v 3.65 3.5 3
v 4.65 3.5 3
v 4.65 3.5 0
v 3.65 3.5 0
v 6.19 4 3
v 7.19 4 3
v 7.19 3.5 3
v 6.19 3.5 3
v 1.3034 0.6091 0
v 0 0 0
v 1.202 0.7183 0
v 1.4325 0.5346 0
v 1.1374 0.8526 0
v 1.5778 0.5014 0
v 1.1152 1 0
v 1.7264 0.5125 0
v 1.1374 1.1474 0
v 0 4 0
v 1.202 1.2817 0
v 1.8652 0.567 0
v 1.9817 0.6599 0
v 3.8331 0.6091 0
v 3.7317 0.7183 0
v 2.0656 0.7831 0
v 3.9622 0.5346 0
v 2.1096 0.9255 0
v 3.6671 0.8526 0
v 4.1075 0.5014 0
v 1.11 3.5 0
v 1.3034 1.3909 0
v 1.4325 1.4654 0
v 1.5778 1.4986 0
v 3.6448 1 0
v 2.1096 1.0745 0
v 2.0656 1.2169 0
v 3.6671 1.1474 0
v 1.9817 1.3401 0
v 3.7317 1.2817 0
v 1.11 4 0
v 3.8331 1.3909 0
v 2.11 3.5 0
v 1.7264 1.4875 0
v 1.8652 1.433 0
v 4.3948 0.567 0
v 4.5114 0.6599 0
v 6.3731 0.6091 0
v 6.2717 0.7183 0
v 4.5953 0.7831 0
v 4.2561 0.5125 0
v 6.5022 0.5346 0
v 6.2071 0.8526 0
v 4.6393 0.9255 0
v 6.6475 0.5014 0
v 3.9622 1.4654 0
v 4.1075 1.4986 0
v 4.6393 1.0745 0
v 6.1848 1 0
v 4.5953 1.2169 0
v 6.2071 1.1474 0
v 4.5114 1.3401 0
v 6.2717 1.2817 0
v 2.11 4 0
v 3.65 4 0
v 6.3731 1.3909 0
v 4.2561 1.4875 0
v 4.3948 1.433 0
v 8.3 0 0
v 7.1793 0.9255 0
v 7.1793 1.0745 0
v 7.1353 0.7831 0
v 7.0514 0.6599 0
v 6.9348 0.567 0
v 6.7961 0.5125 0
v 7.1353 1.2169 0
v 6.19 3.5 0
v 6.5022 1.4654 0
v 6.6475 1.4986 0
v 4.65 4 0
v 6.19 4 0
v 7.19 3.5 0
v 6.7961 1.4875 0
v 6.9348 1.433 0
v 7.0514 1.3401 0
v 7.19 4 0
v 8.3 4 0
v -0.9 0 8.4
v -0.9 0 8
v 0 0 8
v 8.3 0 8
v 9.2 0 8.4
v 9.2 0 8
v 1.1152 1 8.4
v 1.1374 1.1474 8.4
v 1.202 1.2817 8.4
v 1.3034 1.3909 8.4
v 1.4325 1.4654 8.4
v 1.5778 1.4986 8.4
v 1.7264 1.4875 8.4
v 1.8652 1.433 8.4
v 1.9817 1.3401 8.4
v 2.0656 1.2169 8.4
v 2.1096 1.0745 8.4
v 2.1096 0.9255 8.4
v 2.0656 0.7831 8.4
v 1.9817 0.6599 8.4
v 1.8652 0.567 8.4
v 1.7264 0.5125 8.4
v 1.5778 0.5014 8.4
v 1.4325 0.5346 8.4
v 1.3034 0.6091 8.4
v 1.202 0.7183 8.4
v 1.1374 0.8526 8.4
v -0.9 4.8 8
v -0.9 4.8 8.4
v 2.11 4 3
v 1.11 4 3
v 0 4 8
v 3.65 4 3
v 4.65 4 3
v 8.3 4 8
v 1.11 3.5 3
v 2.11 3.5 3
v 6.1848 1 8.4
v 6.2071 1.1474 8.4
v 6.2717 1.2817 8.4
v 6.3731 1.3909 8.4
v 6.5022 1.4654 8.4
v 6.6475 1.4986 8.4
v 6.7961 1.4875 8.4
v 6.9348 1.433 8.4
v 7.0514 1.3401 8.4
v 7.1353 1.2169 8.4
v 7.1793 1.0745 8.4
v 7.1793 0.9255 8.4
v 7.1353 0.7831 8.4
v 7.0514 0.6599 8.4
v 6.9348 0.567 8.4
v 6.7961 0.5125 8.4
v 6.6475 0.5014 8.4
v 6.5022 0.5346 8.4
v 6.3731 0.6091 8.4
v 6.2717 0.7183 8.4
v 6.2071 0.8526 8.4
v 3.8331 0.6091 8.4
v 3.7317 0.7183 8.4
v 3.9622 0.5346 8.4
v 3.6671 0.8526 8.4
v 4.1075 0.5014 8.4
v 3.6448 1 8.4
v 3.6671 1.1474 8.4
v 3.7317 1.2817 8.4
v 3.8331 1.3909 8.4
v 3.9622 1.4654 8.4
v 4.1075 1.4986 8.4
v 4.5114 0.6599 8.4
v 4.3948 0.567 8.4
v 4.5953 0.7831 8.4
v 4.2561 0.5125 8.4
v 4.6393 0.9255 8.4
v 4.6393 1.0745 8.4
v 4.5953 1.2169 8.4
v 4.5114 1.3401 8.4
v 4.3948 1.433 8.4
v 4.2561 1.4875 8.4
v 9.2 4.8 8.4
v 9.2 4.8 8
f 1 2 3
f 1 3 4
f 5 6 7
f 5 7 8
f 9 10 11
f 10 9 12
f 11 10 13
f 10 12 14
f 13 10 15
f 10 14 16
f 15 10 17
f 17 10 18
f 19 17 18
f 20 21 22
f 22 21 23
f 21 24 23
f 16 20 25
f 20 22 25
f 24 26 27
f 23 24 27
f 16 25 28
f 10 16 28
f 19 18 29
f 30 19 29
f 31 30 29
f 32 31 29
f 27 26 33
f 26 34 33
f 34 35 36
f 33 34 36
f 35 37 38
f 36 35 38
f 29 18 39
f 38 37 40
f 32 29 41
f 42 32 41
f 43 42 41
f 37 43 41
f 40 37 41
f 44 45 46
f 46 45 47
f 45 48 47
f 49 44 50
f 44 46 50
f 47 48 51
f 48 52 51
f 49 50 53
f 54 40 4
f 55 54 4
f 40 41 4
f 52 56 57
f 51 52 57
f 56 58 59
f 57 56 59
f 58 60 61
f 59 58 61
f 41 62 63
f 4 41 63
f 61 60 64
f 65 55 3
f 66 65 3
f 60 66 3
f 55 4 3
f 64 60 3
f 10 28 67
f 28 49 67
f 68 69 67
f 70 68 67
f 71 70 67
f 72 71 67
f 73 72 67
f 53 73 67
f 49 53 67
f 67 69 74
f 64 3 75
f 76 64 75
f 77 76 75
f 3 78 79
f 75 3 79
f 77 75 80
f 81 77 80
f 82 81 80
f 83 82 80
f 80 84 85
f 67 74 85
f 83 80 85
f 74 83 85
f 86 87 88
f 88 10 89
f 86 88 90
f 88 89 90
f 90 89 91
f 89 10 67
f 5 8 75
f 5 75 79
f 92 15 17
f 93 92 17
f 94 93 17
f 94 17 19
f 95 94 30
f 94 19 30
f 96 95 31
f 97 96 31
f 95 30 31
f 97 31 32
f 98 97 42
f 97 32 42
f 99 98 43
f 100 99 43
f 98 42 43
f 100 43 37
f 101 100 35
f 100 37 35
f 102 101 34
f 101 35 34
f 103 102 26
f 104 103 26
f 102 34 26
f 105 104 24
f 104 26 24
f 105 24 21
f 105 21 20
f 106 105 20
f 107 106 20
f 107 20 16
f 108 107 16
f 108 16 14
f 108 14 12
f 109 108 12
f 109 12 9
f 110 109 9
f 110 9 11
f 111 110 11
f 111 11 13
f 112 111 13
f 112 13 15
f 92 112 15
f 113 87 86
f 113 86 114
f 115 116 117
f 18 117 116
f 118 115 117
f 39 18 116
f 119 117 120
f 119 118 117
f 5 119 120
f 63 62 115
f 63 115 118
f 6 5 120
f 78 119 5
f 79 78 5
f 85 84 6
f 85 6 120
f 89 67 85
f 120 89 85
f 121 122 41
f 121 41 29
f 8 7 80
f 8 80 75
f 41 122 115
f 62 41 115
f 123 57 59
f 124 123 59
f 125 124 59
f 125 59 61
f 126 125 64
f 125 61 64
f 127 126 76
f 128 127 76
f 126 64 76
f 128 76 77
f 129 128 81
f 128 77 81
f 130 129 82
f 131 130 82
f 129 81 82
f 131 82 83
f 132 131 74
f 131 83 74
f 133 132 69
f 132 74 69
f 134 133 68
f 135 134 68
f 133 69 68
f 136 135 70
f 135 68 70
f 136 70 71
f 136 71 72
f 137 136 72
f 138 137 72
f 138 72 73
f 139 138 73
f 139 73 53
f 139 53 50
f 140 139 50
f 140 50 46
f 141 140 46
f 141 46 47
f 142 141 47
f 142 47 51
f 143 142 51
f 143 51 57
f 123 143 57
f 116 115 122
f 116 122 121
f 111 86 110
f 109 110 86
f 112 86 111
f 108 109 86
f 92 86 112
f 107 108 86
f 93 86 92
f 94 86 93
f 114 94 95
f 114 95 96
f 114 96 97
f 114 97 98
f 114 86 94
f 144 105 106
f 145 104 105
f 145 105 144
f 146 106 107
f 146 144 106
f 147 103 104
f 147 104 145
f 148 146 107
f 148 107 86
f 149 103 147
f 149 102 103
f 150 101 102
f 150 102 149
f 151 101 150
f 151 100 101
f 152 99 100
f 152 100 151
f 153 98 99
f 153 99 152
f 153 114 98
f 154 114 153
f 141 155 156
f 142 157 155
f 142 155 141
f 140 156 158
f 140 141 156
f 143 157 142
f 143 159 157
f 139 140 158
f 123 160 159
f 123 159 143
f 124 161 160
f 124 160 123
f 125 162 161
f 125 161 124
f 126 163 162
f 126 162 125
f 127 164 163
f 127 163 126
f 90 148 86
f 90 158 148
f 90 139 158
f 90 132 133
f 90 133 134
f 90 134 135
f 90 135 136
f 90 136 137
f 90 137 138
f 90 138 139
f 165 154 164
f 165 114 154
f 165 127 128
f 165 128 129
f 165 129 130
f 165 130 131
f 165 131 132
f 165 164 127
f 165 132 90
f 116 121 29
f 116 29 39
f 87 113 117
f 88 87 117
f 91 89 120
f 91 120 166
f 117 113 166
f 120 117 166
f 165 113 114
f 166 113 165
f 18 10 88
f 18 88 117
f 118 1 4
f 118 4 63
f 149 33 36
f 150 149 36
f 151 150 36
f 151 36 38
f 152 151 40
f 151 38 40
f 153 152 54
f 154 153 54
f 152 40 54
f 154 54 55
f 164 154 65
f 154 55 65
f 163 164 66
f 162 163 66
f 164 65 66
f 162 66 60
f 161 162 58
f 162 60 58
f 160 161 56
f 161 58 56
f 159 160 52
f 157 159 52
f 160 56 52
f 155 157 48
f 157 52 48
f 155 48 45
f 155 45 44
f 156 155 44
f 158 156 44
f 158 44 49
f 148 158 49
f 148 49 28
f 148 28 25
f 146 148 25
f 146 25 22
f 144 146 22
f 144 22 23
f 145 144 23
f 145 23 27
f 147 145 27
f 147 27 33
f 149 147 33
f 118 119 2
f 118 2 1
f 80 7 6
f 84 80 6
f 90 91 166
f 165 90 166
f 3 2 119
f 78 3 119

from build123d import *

# Parameters (mm, degrees)
SKETCH_2_W               = 8.3
SKETCH_2_H               = 4
EXTRUDE_1_DEPTH          = 8
SKETCH_3_W               = 10.1
SKETCH_3_H               = 4.8
EXTRUDE_2_DEPTH          = 0.4
CUT_EXTRUDE_1_DEPTH      = 14.350655415
CUT_EXTRUDE_1_DEPTH_BACK = 3
SKETCH_4_W               = 1
SKETCH_4_H               = 0.5
SKETCH_5_R               = 0.5
CUT_EXTRUDE_2_DEPTH      = 10


with BuildPart() as part:
    # 草图2 → 凸台-拉伸1 (new body)
    with BuildSketch(Plane.XY):
        with Locations((4.15, 2)):
            Rectangle(SKETCH_2_W, SKETCH_2_H)
    extrude(amount=EXTRUDE_1_DEPTH)

    # 草图3 → 凸台-拉伸2 (add)
    with BuildSketch(Plane.XY.offset(8)):
        with Locations((4.15, 2.4)):
            Rectangle(SKETCH_3_W, SKETCH_3_H)
    extrude(amount=EXTRUDE_2_DEPTH)

    # 草图4 → 切除-拉伸1 (cut, two sides: drawn at the far end of the back side and taken through both)
    with BuildSketch(Plane(origin=(0, 0, 0), x_dir=(-1, 0, 0), z_dir=(0, 0, -1)).offset(-CUT_EXTRUDE_1_DEPTH_BACK)):
        with Locations((-4.15, 3.75)):
            Rectangle(SKETCH_4_W, SKETCH_4_H)
        with Locations((-6.69, 3.75)):
            Rectangle(SKETCH_4_W, SKETCH_4_H)
        with Locations((-1.61, 3.75)):
            Rectangle(SKETCH_4_W, SKETCH_4_H)
    extrude(amount=CUT_EXTRUDE_1_DEPTH + CUT_EXTRUDE_1_DEPTH_BACK, mode=Mode.SUBTRACT)

    # 草图5 → 切除-拉伸2 (cut)
    with BuildSketch(Plane(origin=(0, 0, 0), x_dir=(-1, 0, 0), z_dir=(0, 0, -1))):
        with Locations((-6.684838564, 1)):
            Circle(SKETCH_5_R)
        with Locations((-4.144838564, 1)):
            Circle(SKETCH_5_R)
        with Locations((-1.615161436, 1)):
            Circle(SKETCH_5_R)
    extrude(amount=-CUT_EXTRUDE_2_DEPTH, mode=Mode.SUBTRACT)


solid = part.part
